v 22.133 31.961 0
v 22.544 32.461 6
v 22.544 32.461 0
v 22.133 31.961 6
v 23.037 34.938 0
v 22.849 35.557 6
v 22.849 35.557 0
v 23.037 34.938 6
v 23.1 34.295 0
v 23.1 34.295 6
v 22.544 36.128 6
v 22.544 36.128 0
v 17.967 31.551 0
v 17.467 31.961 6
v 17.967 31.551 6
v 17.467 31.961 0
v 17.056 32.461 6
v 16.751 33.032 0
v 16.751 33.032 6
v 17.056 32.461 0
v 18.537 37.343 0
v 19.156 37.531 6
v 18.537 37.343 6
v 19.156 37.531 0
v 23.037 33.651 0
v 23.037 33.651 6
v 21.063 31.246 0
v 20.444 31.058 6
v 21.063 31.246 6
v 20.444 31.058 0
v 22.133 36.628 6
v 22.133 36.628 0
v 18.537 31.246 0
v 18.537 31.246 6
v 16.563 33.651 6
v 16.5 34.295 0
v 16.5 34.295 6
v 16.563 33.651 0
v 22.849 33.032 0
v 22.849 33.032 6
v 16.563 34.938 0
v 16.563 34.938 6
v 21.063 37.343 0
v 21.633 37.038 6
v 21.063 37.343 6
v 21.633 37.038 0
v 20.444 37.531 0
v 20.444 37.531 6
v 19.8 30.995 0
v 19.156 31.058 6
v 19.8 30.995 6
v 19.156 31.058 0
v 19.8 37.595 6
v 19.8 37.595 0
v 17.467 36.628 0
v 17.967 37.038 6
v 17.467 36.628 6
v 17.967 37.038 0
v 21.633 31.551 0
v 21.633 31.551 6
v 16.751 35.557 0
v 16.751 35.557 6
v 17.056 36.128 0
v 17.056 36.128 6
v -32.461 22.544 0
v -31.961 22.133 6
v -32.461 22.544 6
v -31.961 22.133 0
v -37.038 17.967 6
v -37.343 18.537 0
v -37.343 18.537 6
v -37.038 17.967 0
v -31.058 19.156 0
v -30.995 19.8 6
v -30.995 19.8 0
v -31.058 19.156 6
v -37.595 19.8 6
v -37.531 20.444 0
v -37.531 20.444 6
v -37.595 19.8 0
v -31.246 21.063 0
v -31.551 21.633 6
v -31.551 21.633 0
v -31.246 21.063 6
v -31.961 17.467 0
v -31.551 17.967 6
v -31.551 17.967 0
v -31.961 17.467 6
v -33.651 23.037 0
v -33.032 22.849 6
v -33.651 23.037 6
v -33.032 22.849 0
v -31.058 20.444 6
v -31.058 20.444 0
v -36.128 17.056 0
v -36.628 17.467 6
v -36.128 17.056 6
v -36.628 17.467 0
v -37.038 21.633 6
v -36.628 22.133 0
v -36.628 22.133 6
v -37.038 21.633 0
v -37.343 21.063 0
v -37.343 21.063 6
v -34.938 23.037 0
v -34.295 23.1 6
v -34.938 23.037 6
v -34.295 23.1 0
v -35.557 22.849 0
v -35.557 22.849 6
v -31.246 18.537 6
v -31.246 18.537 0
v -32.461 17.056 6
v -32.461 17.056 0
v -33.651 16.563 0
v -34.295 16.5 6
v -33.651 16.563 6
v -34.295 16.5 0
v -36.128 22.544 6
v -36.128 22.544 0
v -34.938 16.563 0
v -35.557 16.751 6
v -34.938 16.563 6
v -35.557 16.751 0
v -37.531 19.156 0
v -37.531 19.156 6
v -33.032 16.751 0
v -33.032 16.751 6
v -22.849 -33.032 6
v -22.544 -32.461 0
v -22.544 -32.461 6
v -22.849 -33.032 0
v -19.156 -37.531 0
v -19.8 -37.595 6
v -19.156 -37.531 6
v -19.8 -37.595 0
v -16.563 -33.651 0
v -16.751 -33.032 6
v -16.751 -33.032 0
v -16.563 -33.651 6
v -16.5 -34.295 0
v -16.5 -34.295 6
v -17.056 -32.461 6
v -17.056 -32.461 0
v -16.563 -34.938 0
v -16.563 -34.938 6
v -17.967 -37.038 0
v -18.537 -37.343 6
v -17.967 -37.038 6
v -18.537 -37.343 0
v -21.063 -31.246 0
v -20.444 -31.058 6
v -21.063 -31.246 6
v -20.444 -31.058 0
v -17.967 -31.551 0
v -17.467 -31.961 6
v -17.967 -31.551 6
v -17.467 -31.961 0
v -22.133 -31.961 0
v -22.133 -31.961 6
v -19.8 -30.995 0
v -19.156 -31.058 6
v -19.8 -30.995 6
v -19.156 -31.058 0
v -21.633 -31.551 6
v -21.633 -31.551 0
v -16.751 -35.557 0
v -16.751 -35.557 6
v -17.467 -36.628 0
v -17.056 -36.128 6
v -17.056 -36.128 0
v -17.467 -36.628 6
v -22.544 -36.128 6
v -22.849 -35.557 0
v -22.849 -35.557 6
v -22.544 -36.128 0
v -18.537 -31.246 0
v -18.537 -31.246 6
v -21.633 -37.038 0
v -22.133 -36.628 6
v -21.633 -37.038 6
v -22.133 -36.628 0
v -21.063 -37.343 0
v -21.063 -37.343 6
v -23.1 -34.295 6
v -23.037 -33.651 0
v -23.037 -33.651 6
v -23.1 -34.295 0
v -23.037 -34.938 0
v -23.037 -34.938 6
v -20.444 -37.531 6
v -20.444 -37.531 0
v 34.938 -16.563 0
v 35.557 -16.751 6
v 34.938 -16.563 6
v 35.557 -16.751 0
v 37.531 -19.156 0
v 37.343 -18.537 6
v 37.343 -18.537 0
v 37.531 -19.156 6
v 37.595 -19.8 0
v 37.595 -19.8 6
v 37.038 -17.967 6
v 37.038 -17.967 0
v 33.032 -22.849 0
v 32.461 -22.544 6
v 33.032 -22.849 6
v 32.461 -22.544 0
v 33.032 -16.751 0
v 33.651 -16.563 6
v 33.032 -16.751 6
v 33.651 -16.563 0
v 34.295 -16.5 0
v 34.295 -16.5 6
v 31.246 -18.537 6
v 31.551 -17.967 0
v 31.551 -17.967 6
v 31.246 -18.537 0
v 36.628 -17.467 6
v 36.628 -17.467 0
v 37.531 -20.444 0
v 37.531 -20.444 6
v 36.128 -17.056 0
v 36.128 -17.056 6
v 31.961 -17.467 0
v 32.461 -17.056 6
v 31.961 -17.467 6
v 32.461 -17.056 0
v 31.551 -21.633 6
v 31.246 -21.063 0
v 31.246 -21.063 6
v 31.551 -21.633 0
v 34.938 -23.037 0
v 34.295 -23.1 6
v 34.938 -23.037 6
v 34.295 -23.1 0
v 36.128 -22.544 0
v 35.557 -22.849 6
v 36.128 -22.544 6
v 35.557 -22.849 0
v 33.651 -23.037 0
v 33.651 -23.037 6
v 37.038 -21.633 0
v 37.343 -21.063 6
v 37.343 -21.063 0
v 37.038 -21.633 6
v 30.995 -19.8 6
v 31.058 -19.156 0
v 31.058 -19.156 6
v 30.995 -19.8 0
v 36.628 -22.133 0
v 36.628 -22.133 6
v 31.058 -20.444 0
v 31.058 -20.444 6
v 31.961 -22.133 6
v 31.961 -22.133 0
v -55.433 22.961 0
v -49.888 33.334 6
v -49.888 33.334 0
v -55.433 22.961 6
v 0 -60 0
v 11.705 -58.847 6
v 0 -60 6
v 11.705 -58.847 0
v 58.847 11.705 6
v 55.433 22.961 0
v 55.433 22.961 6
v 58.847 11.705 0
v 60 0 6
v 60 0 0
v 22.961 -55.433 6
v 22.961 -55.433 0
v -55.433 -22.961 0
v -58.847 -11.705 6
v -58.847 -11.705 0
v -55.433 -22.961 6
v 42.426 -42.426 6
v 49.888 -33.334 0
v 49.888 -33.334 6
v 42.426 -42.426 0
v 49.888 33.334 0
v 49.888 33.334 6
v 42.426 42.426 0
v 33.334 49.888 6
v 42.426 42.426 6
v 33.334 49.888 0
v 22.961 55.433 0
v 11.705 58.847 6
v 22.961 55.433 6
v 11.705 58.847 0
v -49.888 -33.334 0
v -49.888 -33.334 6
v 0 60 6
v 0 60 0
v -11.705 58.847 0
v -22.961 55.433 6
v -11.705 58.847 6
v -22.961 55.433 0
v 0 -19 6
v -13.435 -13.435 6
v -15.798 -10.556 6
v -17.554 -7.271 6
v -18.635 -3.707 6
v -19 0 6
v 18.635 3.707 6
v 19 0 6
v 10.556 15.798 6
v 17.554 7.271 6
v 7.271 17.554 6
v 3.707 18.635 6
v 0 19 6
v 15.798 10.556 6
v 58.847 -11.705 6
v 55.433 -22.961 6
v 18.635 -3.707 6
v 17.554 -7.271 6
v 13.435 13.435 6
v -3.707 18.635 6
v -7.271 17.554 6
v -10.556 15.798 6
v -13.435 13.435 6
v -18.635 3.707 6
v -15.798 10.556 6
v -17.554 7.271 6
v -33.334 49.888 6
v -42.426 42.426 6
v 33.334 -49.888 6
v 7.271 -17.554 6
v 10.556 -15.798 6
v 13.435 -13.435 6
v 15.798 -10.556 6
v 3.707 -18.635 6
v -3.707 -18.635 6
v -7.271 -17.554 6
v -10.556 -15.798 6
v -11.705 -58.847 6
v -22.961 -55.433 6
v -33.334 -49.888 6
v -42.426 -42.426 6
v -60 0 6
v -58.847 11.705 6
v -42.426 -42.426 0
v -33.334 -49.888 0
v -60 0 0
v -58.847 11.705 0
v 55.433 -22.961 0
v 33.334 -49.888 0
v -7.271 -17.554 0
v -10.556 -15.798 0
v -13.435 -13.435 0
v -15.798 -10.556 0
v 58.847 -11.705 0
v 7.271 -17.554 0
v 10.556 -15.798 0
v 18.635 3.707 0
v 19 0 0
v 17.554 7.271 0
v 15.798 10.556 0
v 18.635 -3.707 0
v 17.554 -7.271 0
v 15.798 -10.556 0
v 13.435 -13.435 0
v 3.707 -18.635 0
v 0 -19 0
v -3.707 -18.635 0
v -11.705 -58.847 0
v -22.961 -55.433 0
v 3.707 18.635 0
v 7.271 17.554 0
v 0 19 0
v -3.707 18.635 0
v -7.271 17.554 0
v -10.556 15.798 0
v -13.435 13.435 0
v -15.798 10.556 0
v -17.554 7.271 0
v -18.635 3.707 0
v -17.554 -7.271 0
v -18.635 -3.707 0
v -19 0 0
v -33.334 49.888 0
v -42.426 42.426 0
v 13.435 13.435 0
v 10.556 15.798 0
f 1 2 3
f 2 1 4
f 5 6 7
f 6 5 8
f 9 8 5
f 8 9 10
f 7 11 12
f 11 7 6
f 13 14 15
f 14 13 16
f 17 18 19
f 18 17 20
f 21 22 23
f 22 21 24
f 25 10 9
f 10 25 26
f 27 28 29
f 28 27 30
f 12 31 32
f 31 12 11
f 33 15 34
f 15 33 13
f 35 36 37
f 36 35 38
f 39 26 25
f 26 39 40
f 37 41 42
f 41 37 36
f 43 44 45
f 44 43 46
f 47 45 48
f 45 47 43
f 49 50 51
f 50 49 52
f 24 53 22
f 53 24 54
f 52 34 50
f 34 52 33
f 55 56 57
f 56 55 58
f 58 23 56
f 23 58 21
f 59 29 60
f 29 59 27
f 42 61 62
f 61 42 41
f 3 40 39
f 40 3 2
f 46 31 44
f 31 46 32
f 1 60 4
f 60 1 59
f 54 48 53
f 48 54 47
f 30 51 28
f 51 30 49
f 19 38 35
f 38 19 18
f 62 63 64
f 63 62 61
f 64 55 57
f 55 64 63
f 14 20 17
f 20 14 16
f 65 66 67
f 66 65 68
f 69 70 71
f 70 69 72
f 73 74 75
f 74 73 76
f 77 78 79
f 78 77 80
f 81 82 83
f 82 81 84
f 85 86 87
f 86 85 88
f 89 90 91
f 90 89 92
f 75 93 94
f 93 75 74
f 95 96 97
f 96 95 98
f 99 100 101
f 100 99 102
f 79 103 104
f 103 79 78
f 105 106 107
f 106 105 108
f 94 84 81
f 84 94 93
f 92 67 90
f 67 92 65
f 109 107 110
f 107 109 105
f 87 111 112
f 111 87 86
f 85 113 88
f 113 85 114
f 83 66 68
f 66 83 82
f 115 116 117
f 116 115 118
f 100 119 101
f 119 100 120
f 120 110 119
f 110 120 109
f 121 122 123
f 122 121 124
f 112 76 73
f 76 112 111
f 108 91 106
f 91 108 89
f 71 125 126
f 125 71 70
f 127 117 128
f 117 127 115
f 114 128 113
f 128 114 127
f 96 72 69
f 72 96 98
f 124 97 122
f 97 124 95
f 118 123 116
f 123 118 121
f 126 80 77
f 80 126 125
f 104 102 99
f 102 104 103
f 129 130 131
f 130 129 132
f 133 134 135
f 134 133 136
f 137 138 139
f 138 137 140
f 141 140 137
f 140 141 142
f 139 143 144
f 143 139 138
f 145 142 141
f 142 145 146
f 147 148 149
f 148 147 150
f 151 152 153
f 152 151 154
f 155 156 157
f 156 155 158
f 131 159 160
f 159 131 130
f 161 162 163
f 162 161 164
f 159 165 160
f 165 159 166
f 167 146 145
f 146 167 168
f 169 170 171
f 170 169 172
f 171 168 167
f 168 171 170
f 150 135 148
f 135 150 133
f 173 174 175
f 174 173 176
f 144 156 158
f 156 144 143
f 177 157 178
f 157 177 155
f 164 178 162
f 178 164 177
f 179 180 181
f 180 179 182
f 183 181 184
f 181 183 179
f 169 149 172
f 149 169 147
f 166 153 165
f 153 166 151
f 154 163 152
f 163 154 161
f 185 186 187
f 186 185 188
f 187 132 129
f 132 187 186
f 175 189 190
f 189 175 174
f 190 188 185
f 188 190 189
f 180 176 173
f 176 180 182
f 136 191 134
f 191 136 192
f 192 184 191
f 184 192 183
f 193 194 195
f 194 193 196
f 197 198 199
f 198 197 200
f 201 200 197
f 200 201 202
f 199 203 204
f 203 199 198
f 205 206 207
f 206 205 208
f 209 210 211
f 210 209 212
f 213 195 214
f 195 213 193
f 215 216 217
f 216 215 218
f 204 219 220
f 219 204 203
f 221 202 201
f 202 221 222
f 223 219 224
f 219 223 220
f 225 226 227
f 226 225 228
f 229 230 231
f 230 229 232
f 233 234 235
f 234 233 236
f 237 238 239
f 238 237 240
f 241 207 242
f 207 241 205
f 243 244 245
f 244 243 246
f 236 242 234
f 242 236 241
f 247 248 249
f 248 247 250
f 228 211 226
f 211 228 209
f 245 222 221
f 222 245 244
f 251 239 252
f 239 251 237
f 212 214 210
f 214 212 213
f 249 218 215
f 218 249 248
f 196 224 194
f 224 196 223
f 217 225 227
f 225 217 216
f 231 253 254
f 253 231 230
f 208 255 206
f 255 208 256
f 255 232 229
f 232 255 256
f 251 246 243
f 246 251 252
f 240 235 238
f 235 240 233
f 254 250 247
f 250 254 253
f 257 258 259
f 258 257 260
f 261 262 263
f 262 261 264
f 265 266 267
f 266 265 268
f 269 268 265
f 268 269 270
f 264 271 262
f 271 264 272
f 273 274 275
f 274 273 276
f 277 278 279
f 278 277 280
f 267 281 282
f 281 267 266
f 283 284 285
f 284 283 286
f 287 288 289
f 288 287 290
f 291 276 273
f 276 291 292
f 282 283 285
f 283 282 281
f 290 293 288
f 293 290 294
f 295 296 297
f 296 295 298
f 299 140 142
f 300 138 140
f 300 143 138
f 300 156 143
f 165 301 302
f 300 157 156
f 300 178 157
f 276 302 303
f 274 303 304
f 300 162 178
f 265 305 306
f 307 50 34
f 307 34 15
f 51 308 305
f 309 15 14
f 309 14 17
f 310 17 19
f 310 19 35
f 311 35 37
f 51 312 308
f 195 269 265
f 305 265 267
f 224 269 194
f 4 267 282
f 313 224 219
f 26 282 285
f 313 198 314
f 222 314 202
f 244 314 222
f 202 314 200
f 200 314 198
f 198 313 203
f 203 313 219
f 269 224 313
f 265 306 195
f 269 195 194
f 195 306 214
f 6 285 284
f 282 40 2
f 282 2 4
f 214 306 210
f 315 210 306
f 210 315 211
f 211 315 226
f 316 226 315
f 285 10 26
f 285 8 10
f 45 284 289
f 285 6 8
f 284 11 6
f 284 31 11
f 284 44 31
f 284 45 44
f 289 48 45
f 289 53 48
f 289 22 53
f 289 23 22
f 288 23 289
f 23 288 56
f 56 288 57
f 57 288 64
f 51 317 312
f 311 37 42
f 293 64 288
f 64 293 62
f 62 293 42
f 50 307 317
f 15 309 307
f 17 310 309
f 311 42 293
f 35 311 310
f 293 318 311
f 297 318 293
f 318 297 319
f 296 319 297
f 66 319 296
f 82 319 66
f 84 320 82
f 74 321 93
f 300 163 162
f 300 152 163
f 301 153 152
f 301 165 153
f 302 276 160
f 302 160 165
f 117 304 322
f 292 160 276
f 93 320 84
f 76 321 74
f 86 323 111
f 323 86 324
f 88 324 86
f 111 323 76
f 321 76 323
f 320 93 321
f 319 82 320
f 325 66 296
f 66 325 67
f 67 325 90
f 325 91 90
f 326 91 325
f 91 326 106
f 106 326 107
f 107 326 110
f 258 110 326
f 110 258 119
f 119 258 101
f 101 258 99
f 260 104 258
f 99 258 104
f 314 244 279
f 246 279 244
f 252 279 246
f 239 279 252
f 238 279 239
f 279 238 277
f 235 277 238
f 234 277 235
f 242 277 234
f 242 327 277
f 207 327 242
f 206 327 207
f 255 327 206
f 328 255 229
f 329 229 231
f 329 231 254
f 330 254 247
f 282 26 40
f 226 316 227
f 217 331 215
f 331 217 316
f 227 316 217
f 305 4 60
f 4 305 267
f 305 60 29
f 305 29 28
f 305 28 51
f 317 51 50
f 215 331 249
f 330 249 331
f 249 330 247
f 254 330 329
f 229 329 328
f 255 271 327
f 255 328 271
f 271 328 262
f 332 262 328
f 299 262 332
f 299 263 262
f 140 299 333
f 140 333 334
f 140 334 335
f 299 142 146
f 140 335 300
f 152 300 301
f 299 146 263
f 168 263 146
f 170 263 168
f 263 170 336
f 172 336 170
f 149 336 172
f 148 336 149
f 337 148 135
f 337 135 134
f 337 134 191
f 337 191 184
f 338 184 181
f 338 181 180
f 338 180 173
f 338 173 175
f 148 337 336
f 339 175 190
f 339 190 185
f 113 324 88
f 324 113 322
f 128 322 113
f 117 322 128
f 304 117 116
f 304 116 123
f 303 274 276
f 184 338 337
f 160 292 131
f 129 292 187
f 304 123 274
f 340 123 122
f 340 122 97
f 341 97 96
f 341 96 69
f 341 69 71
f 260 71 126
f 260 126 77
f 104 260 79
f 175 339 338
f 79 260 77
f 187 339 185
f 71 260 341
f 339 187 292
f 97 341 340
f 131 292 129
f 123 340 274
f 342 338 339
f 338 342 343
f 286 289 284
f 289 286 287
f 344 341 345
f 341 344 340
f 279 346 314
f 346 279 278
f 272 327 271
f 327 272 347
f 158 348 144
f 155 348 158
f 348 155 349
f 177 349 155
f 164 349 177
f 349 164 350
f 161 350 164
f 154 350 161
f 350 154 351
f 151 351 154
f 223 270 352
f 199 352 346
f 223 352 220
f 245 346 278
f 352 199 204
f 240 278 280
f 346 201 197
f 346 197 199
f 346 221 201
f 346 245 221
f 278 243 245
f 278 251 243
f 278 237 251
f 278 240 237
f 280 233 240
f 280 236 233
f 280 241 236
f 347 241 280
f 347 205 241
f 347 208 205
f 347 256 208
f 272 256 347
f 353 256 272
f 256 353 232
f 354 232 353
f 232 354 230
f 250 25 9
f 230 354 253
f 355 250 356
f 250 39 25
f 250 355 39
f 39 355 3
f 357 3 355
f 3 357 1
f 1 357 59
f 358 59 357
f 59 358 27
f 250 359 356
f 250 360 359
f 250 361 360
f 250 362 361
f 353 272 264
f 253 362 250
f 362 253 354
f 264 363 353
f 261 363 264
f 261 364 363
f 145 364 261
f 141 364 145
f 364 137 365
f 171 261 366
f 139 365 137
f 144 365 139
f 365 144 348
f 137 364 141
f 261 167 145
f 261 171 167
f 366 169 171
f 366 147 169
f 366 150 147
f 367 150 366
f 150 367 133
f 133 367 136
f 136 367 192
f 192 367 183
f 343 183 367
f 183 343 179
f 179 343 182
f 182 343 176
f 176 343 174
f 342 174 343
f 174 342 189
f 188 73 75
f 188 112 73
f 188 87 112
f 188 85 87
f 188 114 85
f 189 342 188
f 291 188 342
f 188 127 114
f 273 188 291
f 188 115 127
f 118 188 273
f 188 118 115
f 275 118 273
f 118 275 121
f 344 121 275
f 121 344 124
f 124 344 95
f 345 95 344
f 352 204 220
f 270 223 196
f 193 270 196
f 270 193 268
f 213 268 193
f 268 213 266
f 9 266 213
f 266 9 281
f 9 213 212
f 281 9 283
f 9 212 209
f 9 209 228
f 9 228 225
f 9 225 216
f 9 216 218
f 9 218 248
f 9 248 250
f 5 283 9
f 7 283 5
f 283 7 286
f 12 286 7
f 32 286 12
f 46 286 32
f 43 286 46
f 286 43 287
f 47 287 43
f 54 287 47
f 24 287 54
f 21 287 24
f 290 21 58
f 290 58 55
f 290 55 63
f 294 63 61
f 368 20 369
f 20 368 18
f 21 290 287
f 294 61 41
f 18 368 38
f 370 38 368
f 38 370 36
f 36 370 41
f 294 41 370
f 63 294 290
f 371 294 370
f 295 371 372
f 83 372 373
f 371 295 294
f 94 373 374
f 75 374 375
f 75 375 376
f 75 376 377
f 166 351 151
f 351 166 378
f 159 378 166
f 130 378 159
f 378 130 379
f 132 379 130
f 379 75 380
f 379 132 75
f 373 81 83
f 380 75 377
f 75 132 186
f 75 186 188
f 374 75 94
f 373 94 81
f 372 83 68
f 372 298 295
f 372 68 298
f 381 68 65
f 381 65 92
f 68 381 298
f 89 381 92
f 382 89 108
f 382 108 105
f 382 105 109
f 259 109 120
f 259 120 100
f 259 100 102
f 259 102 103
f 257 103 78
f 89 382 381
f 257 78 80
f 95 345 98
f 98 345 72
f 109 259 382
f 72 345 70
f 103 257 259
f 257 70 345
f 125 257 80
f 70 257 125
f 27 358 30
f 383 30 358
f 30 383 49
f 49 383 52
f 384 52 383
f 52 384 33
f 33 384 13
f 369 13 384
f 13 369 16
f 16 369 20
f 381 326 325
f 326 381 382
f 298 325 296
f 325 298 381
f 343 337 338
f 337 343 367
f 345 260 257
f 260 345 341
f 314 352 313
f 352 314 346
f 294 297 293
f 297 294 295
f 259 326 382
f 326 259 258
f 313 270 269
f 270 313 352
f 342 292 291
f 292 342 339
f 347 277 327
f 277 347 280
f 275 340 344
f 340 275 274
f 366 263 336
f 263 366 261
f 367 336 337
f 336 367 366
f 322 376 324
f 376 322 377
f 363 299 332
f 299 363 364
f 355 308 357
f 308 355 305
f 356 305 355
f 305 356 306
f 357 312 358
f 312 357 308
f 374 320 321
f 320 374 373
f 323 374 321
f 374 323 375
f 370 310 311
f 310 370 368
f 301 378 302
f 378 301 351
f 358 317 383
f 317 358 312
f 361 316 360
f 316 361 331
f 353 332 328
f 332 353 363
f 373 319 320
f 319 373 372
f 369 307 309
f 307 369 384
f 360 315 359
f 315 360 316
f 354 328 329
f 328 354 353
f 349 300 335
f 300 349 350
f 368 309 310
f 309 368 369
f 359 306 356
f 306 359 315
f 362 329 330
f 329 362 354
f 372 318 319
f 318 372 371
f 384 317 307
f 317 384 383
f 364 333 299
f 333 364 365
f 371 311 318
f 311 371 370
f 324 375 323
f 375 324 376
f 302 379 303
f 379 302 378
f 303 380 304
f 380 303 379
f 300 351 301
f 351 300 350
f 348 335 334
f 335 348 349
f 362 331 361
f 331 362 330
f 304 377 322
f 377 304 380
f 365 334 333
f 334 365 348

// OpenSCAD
$fn = 32;

// ----------------------------------------------------------------------
// Flange Ø120 x 6
// 4 holes on a Ø79.2 bolt circle, bolted joints
// ----------------------------------------------------------------------

// --- parameters (mm) ---
flange_d = 120;  // outside diameter of the flange
thickness = 6;   // flange thickness
holes = 4;       // number of bolt holes
pcd = 79.2;      // bolt circle diameter
start_deg = 60;  // angle of the first hole, from +X
hole_d = 6.6;    // bolt hole diameter
bore_d = 38;     // central through bore
hub_d = 46;      // hub outside diameter
hub_h = 0;       // hub height above the flange face (0 = no hub)

// --- derived feature positions (mm) ---
height = thickness + hub_h;  // = 6   overall height of the part
pcd_r = pcd / 2;             // = 39.6   bolt circle radius
hole_step = 360 / holes;     // = 90   angular pitch
feature_centers = [
  [pcd_r * cos(start_deg + 0 * hole_step), pcd_r * sin(start_deg + 0 * hole_step)],
  [pcd_r * cos(start_deg + 1 * hole_step), pcd_r * sin(start_deg + 1 * hole_step)],
  [pcd_r * cos(start_deg + 2 * hole_step), pcd_r * sin(start_deg + 2 * hole_step)],
  [pcd_r * cos(start_deg + 3 * hole_step), pcd_r * sin(start_deg + 3 * hole_step)]
];   // bolt hole centres on the pitch circle

// flange disc, every hole and the bore cut straight through
difference() {
  union() {
    cylinder(d = flange_d, h = thickness);
  }
  translate([0, 0, -1]) cylinder(d = bore_d, h = height + 2);  // bore, through
  for (centre = feature_centers)
    translate([centre[0], centre[1], -1]) cylinder(d = hole_d, h = thickness + 2);
}
